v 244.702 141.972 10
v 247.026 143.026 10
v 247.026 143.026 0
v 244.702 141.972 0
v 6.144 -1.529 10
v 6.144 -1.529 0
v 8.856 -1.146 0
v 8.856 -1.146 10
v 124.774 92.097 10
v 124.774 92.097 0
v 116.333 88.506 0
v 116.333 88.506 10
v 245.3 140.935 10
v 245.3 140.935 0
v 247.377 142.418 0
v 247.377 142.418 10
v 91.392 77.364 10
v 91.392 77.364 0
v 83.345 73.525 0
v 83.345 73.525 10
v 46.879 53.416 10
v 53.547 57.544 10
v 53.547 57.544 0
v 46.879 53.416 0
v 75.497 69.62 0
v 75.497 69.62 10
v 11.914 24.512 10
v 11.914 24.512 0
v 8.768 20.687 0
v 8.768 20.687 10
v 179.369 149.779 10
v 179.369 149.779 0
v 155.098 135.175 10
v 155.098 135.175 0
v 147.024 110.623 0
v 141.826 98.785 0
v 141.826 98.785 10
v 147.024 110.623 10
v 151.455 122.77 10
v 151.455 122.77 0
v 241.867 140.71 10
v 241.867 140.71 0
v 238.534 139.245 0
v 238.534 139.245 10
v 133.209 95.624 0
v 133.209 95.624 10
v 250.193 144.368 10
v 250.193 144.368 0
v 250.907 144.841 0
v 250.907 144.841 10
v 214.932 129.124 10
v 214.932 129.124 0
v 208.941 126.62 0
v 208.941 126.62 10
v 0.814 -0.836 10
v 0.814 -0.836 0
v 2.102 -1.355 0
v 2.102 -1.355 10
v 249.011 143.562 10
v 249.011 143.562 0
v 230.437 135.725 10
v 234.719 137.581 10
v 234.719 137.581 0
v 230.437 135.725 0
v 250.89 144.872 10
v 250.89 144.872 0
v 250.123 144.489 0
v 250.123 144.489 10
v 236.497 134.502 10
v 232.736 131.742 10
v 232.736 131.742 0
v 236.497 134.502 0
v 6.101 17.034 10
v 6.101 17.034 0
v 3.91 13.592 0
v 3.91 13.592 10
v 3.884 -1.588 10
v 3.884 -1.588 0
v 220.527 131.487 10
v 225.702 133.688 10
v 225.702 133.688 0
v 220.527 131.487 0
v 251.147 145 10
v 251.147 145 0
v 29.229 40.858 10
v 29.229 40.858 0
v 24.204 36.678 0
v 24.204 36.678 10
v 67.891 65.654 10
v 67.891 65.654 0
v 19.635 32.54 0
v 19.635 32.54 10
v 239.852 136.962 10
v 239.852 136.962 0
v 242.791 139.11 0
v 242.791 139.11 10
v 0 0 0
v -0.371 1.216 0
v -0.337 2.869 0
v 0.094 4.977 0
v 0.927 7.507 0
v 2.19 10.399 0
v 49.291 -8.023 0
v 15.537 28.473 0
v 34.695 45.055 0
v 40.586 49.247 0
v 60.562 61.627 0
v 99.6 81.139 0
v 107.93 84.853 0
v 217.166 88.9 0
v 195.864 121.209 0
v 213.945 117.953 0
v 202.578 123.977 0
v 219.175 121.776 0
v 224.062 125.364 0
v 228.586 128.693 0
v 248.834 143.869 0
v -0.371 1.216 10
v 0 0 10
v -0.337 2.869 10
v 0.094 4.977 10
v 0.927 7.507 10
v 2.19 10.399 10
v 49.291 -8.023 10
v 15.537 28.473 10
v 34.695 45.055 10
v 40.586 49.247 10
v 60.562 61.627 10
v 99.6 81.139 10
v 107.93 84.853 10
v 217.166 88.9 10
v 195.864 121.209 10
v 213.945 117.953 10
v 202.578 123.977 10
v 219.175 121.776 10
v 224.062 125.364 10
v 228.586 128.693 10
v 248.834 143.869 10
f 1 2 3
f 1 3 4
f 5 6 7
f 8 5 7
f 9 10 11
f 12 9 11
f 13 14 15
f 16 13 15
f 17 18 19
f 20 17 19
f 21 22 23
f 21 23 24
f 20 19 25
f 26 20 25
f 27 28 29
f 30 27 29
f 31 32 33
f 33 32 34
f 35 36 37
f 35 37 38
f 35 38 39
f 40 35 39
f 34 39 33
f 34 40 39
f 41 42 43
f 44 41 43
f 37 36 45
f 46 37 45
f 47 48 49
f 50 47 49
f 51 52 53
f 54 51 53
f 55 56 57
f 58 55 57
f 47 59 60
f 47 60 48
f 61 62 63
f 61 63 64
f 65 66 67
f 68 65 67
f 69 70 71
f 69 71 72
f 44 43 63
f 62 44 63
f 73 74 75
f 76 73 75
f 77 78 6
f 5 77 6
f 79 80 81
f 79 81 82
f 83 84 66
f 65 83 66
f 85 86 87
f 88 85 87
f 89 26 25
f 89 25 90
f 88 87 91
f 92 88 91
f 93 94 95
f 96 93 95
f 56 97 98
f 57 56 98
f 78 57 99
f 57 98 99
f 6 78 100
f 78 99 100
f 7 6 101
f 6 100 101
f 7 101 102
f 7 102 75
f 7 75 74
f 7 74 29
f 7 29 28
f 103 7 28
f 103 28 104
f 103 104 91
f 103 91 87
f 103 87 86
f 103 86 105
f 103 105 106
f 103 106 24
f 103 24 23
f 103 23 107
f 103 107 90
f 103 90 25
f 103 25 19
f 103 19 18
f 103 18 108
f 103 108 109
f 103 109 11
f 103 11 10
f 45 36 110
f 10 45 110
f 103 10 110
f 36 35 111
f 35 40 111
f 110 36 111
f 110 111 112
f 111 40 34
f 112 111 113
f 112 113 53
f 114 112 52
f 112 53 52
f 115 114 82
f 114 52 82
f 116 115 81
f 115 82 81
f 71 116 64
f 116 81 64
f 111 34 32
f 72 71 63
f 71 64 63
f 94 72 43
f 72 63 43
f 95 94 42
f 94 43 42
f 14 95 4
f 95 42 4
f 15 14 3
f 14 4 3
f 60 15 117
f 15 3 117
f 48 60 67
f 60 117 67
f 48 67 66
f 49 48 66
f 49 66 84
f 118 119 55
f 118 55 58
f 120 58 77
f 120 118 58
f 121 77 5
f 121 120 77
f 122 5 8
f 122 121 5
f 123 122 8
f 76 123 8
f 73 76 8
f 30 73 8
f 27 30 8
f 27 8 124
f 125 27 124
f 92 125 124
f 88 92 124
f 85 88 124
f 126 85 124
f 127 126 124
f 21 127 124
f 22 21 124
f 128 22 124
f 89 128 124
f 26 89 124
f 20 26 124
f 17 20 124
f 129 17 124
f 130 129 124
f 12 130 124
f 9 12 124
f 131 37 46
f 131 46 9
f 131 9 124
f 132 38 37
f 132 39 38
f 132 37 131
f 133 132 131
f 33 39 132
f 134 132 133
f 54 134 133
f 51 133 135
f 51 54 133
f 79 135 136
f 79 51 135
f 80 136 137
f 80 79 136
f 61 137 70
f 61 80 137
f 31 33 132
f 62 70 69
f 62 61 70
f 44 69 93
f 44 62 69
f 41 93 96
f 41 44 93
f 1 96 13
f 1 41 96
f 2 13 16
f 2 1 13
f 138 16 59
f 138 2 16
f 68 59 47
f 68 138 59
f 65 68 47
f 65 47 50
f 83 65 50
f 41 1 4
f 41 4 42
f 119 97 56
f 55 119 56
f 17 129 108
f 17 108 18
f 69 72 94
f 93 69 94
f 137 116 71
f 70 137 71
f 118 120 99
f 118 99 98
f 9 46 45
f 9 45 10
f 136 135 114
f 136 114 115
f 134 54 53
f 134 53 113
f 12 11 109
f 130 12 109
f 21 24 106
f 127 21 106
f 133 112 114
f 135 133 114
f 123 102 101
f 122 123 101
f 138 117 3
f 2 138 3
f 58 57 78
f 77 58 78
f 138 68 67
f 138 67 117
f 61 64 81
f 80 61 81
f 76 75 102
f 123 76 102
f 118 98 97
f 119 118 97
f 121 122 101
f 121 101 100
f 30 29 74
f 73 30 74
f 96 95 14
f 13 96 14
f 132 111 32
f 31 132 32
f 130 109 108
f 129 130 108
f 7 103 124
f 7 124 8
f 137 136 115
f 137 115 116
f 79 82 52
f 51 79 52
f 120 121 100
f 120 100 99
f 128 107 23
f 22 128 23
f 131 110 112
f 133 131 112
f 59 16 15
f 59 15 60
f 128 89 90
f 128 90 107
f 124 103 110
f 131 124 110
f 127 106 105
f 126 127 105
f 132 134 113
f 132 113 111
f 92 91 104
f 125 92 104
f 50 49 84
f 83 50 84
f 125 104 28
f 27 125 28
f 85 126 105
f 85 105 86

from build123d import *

# Parameters (mm, degrees)
PAD_DEPTH = 10


with BuildPart() as part:
    # Sketch → Pad (new body)
    with BuildSketch(Plane(origin=(0, 0, 0), x_dir=(0.866025, 0.5, 0), z_dir=(0, 0, 1))):
        with BuildLine():
            Line((290, 0), (289.7129, 0.0174))
            Line((289.7129, 0.0174), (288.8574, 0.0696))
            Line((288.8574, 0.0696), (287.4306, 0.1769))
            Line((287.4306, 0.1769), (285.4441, 0.3509))
            Line((285.4441, 0.3509), (282.9037, 0.6003))
            Line((282.9037, 0.6003), (279.8181, 0.9251))
            Line((279.8181, 0.9251), (276.1989, 1.3224))
            Line((276.1989, 1.3224), (272.0635, 1.7893))
            Line((272.0635, 1.7893), (267.4264, 2.3229))
            Line((267.4264, 2.3229), (262.3079, 2.9261))
            Line((262.3079, 2.9261), (256.7254, 3.6076))
            Line((256.7254, 3.6076), (250.6992, 4.3587))
            Line((250.6992, 4.3587), (244.2583, 5.1852))
            Line((244.2583, 5.1852), (237.4259, 6.0784))
            Line((237.4259, 6.0784), (230.2281, 7.0383))
            Line((230.2281, 7.0383), (230.2281, 40.028069))
            Line((230.2281, 40.028069), (201.90651, 39.515951))
            ThreePointArc((172.217343, 14.637652), (187.660006, 26.363067), (201.90651, 39.515951))
            Line((172.217343, 14.637652), (163.1743, 16.2081))
            Line((163.1743, 16.2081), (154.106, 17.371))
            Line((154.106, 17.371), (145, 18.4817))
            Line((145, 18.4817), (135.8969, 19.5199))
            Line((135.8969, 19.5199), (126.8257, 20.4682))
            Line((126.8257, 20.4682), (117.8299, 21.3034))
            Line((117.8299, 21.3034), (108.9414, 22.0023))
            Line((108.9414, 22.0023), (100.1921, 22.5446))
            Line((100.1921, 22.5446), (91.6226, 22.9129))
            Line((91.6226, 22.9129), (83.2619, 23.0898))
            Line((83.2619, 23.0898), (75.1448, 23.0608))
            Line((75.1448, 23.0608), (67.3061, 22.8201))
            Line((67.3061, 22.8201), (59.7719, 22.3561))
            Line((59.7719, 22.3561), (52.5741, 21.6717))
            Line((52.5741, 21.6717), (45.7417, 20.7698))
            Line((45.7417, 20.7698), (39.3008, 19.662))
            Line((39.3008, 19.662), (33.2746, 18.3628))
            Line((33.2746, 18.3628), (27.6921, 16.8896))
            Line((27.6921, 16.8896), (22.5736, 15.2714))
            Line((22.5736, 15.2714), (17.9365, 13.5314))
            Line((17.9365, 13.5314), (13.8011, 11.7015))
            Line((13.8011, 11.7015), (10.1819, 9.8165))
            Line((10.1819, 9.8165), (7.0963, 7.9112))
            Line((7.0963, 7.9112), (4.5559, 6.0378))
            Line((4.5559, 6.0378), (2.5694, 4.263))
            Line((2.5694, 4.263), (1.1426, 2.6535))
            Line((1.1426, 2.6535), (0.2871, 1.2383))
            Line((0.2871, 1.2383), (0, 0))
            Line((0, 0), (0.2871, -1.131))
            Line((0.2871, -1.131), (1.1426, -2.2243))
            Line((1.1426, -2.2243), (2.5694, -3.3176))
            Line((2.5694, -3.3176), (4.5559, -4.3964))
            Line((4.5559, -4.3964), (7.0963, -5.4201))
            Line((38.675534, -31.593528), (7.0963, -5.4201))
            Line((38.675534, -31.593528), (232.520951, -31.593528))
            Line((232.520951, -31.593528), (244.2583, -4.8227))
            Line((244.2583, -4.8227), (250.6992, -4.1267))
            Line((250.6992, -4.1267), (256.7254, -3.4626))
            Line((256.7254, -3.4626), (262.3079, -2.842))
            Line((262.3079, -2.842), (267.4264, -2.2765))
            Line((267.4264, -2.2765), (272.0635, -1.7661))
            Line((272.0635, -1.7661), (276.1989, -1.3137))
            Line((276.1989, -1.3137), (279.8181, -0.9222))
            Line((279.8181, -0.9222), (282.9037, -0.5974))
            Line((282.9037, -0.5974), (285.4441, -0.3509))
            Line((285.4441, -0.3509), (287.4306, -0.1769))
            Line((287.4306, -0.1769), (288.8574, -0.0696))
            Line((288.8574, -0.0696), (289.7129, -0.0174))
            Line((289.7129, -0.0174), (290, 0))
        make_face()
    extrude(amount=PAD_DEPTH)


solid = part.part
